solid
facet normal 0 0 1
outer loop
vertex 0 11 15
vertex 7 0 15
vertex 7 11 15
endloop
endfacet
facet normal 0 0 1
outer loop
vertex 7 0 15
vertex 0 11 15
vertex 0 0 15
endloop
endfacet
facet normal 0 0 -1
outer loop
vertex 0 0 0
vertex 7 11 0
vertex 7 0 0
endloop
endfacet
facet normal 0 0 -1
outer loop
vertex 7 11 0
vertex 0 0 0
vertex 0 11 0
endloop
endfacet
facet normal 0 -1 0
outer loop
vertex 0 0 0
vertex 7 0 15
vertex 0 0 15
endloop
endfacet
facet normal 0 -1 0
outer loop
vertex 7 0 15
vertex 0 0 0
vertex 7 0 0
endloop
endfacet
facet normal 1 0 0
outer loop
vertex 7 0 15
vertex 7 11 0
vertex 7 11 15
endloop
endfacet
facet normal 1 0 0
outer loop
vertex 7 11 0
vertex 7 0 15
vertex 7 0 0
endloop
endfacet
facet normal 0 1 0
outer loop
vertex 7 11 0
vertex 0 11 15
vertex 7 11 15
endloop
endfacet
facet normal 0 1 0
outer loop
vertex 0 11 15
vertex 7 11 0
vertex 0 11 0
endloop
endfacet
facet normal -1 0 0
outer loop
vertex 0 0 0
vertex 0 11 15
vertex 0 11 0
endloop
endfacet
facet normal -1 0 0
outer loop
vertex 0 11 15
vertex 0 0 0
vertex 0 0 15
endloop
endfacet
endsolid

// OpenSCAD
// Generated by SolidPython 1.0.1 on 2020-07-29 00:46:55


cube(size = [7, 11, 15]);
/***********************************************
*********      SolidPython code:      **********
************************************************
 
# import packages: SolidPython
from solid import *
from solid.utils import *
from itertools import chain, combinations, permutations


class Resize:

    def __init__(self, scad_file):
        self.scad_file = scad_file
        #self.scad_file = import_scad(scad_file)
        # cone/cylinder param:
        self.r1 = 0
        self.r2 = 0
        self.h = 0
        # rectangular prism param:
        self.w = 0
        self.l = 0
        # ellipse param:
        self.r = 0

    # import OpenScad code (file name corresponds to shape)


    # classify shape + parameters
    def assign(self, param1, param2, param3):
        if self.scad_file == 'cone.scad':
            self.r1 = param1
            self.r2 = param2
            self.h = param3
        elif self.scad_file == 'cylinder.scad':
            self.r1 = param1
            self.r2 = param2
            self.h = param3
        elif self.scad_file == 'rectangularPrism.scad':
            self.h = param1
            self.l = param2
            self.w = param3
        else:
            self.r = param1
            self.h = param2

    # resize parameters
    def iterate(self):
        x = range(3, 20, 2)
        i = 1
        if self.scad_file == 'cone.scad':
            tempList = list(permutations(x, 2))
            for temp in tempList:
                param1 = temp[0]
                param2 = temp[1]
                filepath = 'produced_scad_files/' + 'cone' + str(param1) + '_' + str(param2) + '_' + '.scad'
                scad_render_to_file(cylinder(h=param1, r1=param2, r2=0), filepath)

        elif self.scad_file == 'cylinder.scad':
            tempList = list(permutations(x, 3))
            for temp in tempList:
                param1 = temp[0]
                param2 = temp[1]
                filepath = 'produced_scad_files/' + 'cylinder' + str(param1) + '_' + str(param2) + '_' + '.scad'
                scad_render_to_file(cylinder(h=param1, r1=param2, r2=param2), filepath)

        elif self.scad_file == 'rectangularPrism.scad':
            tempList = list(permutations(x, 3))
            for temp in tempList:
                param1 = temp[0]
                param2 = temp[1]
                param3 = temp[2]
                filepath = 'produced_scad_files/' + 'rectangularPrism' + str(param1) + '_' + str(param2) + '_' + str(
                    param3) + '.scad'
                scad_render_to_file(cube(size=(param1, param2, param3)), filepath)

        elif self.scad_file == 'ellipse.scad':
            tempList = list(permutations(x, 4))
            for temp in tempList:
                param1 = temp[0]
                param2 = temp[1]
                param3 = temp[2]
                param4 = temp[3]
                filepath = 'produced_scad_files/' + 'ellipse' + str(param1) + '_' + str(param2) + '_' + str(param3) + '_' + str(param4) + '.scad'
                scad_render_to_file(scale([param1, param2, param3])(sphere(r=param4)), filepath)

    def render_to_scadfile(self):
        scad_render_to_file(scad, 'example.scad') 
 
************************************************/
